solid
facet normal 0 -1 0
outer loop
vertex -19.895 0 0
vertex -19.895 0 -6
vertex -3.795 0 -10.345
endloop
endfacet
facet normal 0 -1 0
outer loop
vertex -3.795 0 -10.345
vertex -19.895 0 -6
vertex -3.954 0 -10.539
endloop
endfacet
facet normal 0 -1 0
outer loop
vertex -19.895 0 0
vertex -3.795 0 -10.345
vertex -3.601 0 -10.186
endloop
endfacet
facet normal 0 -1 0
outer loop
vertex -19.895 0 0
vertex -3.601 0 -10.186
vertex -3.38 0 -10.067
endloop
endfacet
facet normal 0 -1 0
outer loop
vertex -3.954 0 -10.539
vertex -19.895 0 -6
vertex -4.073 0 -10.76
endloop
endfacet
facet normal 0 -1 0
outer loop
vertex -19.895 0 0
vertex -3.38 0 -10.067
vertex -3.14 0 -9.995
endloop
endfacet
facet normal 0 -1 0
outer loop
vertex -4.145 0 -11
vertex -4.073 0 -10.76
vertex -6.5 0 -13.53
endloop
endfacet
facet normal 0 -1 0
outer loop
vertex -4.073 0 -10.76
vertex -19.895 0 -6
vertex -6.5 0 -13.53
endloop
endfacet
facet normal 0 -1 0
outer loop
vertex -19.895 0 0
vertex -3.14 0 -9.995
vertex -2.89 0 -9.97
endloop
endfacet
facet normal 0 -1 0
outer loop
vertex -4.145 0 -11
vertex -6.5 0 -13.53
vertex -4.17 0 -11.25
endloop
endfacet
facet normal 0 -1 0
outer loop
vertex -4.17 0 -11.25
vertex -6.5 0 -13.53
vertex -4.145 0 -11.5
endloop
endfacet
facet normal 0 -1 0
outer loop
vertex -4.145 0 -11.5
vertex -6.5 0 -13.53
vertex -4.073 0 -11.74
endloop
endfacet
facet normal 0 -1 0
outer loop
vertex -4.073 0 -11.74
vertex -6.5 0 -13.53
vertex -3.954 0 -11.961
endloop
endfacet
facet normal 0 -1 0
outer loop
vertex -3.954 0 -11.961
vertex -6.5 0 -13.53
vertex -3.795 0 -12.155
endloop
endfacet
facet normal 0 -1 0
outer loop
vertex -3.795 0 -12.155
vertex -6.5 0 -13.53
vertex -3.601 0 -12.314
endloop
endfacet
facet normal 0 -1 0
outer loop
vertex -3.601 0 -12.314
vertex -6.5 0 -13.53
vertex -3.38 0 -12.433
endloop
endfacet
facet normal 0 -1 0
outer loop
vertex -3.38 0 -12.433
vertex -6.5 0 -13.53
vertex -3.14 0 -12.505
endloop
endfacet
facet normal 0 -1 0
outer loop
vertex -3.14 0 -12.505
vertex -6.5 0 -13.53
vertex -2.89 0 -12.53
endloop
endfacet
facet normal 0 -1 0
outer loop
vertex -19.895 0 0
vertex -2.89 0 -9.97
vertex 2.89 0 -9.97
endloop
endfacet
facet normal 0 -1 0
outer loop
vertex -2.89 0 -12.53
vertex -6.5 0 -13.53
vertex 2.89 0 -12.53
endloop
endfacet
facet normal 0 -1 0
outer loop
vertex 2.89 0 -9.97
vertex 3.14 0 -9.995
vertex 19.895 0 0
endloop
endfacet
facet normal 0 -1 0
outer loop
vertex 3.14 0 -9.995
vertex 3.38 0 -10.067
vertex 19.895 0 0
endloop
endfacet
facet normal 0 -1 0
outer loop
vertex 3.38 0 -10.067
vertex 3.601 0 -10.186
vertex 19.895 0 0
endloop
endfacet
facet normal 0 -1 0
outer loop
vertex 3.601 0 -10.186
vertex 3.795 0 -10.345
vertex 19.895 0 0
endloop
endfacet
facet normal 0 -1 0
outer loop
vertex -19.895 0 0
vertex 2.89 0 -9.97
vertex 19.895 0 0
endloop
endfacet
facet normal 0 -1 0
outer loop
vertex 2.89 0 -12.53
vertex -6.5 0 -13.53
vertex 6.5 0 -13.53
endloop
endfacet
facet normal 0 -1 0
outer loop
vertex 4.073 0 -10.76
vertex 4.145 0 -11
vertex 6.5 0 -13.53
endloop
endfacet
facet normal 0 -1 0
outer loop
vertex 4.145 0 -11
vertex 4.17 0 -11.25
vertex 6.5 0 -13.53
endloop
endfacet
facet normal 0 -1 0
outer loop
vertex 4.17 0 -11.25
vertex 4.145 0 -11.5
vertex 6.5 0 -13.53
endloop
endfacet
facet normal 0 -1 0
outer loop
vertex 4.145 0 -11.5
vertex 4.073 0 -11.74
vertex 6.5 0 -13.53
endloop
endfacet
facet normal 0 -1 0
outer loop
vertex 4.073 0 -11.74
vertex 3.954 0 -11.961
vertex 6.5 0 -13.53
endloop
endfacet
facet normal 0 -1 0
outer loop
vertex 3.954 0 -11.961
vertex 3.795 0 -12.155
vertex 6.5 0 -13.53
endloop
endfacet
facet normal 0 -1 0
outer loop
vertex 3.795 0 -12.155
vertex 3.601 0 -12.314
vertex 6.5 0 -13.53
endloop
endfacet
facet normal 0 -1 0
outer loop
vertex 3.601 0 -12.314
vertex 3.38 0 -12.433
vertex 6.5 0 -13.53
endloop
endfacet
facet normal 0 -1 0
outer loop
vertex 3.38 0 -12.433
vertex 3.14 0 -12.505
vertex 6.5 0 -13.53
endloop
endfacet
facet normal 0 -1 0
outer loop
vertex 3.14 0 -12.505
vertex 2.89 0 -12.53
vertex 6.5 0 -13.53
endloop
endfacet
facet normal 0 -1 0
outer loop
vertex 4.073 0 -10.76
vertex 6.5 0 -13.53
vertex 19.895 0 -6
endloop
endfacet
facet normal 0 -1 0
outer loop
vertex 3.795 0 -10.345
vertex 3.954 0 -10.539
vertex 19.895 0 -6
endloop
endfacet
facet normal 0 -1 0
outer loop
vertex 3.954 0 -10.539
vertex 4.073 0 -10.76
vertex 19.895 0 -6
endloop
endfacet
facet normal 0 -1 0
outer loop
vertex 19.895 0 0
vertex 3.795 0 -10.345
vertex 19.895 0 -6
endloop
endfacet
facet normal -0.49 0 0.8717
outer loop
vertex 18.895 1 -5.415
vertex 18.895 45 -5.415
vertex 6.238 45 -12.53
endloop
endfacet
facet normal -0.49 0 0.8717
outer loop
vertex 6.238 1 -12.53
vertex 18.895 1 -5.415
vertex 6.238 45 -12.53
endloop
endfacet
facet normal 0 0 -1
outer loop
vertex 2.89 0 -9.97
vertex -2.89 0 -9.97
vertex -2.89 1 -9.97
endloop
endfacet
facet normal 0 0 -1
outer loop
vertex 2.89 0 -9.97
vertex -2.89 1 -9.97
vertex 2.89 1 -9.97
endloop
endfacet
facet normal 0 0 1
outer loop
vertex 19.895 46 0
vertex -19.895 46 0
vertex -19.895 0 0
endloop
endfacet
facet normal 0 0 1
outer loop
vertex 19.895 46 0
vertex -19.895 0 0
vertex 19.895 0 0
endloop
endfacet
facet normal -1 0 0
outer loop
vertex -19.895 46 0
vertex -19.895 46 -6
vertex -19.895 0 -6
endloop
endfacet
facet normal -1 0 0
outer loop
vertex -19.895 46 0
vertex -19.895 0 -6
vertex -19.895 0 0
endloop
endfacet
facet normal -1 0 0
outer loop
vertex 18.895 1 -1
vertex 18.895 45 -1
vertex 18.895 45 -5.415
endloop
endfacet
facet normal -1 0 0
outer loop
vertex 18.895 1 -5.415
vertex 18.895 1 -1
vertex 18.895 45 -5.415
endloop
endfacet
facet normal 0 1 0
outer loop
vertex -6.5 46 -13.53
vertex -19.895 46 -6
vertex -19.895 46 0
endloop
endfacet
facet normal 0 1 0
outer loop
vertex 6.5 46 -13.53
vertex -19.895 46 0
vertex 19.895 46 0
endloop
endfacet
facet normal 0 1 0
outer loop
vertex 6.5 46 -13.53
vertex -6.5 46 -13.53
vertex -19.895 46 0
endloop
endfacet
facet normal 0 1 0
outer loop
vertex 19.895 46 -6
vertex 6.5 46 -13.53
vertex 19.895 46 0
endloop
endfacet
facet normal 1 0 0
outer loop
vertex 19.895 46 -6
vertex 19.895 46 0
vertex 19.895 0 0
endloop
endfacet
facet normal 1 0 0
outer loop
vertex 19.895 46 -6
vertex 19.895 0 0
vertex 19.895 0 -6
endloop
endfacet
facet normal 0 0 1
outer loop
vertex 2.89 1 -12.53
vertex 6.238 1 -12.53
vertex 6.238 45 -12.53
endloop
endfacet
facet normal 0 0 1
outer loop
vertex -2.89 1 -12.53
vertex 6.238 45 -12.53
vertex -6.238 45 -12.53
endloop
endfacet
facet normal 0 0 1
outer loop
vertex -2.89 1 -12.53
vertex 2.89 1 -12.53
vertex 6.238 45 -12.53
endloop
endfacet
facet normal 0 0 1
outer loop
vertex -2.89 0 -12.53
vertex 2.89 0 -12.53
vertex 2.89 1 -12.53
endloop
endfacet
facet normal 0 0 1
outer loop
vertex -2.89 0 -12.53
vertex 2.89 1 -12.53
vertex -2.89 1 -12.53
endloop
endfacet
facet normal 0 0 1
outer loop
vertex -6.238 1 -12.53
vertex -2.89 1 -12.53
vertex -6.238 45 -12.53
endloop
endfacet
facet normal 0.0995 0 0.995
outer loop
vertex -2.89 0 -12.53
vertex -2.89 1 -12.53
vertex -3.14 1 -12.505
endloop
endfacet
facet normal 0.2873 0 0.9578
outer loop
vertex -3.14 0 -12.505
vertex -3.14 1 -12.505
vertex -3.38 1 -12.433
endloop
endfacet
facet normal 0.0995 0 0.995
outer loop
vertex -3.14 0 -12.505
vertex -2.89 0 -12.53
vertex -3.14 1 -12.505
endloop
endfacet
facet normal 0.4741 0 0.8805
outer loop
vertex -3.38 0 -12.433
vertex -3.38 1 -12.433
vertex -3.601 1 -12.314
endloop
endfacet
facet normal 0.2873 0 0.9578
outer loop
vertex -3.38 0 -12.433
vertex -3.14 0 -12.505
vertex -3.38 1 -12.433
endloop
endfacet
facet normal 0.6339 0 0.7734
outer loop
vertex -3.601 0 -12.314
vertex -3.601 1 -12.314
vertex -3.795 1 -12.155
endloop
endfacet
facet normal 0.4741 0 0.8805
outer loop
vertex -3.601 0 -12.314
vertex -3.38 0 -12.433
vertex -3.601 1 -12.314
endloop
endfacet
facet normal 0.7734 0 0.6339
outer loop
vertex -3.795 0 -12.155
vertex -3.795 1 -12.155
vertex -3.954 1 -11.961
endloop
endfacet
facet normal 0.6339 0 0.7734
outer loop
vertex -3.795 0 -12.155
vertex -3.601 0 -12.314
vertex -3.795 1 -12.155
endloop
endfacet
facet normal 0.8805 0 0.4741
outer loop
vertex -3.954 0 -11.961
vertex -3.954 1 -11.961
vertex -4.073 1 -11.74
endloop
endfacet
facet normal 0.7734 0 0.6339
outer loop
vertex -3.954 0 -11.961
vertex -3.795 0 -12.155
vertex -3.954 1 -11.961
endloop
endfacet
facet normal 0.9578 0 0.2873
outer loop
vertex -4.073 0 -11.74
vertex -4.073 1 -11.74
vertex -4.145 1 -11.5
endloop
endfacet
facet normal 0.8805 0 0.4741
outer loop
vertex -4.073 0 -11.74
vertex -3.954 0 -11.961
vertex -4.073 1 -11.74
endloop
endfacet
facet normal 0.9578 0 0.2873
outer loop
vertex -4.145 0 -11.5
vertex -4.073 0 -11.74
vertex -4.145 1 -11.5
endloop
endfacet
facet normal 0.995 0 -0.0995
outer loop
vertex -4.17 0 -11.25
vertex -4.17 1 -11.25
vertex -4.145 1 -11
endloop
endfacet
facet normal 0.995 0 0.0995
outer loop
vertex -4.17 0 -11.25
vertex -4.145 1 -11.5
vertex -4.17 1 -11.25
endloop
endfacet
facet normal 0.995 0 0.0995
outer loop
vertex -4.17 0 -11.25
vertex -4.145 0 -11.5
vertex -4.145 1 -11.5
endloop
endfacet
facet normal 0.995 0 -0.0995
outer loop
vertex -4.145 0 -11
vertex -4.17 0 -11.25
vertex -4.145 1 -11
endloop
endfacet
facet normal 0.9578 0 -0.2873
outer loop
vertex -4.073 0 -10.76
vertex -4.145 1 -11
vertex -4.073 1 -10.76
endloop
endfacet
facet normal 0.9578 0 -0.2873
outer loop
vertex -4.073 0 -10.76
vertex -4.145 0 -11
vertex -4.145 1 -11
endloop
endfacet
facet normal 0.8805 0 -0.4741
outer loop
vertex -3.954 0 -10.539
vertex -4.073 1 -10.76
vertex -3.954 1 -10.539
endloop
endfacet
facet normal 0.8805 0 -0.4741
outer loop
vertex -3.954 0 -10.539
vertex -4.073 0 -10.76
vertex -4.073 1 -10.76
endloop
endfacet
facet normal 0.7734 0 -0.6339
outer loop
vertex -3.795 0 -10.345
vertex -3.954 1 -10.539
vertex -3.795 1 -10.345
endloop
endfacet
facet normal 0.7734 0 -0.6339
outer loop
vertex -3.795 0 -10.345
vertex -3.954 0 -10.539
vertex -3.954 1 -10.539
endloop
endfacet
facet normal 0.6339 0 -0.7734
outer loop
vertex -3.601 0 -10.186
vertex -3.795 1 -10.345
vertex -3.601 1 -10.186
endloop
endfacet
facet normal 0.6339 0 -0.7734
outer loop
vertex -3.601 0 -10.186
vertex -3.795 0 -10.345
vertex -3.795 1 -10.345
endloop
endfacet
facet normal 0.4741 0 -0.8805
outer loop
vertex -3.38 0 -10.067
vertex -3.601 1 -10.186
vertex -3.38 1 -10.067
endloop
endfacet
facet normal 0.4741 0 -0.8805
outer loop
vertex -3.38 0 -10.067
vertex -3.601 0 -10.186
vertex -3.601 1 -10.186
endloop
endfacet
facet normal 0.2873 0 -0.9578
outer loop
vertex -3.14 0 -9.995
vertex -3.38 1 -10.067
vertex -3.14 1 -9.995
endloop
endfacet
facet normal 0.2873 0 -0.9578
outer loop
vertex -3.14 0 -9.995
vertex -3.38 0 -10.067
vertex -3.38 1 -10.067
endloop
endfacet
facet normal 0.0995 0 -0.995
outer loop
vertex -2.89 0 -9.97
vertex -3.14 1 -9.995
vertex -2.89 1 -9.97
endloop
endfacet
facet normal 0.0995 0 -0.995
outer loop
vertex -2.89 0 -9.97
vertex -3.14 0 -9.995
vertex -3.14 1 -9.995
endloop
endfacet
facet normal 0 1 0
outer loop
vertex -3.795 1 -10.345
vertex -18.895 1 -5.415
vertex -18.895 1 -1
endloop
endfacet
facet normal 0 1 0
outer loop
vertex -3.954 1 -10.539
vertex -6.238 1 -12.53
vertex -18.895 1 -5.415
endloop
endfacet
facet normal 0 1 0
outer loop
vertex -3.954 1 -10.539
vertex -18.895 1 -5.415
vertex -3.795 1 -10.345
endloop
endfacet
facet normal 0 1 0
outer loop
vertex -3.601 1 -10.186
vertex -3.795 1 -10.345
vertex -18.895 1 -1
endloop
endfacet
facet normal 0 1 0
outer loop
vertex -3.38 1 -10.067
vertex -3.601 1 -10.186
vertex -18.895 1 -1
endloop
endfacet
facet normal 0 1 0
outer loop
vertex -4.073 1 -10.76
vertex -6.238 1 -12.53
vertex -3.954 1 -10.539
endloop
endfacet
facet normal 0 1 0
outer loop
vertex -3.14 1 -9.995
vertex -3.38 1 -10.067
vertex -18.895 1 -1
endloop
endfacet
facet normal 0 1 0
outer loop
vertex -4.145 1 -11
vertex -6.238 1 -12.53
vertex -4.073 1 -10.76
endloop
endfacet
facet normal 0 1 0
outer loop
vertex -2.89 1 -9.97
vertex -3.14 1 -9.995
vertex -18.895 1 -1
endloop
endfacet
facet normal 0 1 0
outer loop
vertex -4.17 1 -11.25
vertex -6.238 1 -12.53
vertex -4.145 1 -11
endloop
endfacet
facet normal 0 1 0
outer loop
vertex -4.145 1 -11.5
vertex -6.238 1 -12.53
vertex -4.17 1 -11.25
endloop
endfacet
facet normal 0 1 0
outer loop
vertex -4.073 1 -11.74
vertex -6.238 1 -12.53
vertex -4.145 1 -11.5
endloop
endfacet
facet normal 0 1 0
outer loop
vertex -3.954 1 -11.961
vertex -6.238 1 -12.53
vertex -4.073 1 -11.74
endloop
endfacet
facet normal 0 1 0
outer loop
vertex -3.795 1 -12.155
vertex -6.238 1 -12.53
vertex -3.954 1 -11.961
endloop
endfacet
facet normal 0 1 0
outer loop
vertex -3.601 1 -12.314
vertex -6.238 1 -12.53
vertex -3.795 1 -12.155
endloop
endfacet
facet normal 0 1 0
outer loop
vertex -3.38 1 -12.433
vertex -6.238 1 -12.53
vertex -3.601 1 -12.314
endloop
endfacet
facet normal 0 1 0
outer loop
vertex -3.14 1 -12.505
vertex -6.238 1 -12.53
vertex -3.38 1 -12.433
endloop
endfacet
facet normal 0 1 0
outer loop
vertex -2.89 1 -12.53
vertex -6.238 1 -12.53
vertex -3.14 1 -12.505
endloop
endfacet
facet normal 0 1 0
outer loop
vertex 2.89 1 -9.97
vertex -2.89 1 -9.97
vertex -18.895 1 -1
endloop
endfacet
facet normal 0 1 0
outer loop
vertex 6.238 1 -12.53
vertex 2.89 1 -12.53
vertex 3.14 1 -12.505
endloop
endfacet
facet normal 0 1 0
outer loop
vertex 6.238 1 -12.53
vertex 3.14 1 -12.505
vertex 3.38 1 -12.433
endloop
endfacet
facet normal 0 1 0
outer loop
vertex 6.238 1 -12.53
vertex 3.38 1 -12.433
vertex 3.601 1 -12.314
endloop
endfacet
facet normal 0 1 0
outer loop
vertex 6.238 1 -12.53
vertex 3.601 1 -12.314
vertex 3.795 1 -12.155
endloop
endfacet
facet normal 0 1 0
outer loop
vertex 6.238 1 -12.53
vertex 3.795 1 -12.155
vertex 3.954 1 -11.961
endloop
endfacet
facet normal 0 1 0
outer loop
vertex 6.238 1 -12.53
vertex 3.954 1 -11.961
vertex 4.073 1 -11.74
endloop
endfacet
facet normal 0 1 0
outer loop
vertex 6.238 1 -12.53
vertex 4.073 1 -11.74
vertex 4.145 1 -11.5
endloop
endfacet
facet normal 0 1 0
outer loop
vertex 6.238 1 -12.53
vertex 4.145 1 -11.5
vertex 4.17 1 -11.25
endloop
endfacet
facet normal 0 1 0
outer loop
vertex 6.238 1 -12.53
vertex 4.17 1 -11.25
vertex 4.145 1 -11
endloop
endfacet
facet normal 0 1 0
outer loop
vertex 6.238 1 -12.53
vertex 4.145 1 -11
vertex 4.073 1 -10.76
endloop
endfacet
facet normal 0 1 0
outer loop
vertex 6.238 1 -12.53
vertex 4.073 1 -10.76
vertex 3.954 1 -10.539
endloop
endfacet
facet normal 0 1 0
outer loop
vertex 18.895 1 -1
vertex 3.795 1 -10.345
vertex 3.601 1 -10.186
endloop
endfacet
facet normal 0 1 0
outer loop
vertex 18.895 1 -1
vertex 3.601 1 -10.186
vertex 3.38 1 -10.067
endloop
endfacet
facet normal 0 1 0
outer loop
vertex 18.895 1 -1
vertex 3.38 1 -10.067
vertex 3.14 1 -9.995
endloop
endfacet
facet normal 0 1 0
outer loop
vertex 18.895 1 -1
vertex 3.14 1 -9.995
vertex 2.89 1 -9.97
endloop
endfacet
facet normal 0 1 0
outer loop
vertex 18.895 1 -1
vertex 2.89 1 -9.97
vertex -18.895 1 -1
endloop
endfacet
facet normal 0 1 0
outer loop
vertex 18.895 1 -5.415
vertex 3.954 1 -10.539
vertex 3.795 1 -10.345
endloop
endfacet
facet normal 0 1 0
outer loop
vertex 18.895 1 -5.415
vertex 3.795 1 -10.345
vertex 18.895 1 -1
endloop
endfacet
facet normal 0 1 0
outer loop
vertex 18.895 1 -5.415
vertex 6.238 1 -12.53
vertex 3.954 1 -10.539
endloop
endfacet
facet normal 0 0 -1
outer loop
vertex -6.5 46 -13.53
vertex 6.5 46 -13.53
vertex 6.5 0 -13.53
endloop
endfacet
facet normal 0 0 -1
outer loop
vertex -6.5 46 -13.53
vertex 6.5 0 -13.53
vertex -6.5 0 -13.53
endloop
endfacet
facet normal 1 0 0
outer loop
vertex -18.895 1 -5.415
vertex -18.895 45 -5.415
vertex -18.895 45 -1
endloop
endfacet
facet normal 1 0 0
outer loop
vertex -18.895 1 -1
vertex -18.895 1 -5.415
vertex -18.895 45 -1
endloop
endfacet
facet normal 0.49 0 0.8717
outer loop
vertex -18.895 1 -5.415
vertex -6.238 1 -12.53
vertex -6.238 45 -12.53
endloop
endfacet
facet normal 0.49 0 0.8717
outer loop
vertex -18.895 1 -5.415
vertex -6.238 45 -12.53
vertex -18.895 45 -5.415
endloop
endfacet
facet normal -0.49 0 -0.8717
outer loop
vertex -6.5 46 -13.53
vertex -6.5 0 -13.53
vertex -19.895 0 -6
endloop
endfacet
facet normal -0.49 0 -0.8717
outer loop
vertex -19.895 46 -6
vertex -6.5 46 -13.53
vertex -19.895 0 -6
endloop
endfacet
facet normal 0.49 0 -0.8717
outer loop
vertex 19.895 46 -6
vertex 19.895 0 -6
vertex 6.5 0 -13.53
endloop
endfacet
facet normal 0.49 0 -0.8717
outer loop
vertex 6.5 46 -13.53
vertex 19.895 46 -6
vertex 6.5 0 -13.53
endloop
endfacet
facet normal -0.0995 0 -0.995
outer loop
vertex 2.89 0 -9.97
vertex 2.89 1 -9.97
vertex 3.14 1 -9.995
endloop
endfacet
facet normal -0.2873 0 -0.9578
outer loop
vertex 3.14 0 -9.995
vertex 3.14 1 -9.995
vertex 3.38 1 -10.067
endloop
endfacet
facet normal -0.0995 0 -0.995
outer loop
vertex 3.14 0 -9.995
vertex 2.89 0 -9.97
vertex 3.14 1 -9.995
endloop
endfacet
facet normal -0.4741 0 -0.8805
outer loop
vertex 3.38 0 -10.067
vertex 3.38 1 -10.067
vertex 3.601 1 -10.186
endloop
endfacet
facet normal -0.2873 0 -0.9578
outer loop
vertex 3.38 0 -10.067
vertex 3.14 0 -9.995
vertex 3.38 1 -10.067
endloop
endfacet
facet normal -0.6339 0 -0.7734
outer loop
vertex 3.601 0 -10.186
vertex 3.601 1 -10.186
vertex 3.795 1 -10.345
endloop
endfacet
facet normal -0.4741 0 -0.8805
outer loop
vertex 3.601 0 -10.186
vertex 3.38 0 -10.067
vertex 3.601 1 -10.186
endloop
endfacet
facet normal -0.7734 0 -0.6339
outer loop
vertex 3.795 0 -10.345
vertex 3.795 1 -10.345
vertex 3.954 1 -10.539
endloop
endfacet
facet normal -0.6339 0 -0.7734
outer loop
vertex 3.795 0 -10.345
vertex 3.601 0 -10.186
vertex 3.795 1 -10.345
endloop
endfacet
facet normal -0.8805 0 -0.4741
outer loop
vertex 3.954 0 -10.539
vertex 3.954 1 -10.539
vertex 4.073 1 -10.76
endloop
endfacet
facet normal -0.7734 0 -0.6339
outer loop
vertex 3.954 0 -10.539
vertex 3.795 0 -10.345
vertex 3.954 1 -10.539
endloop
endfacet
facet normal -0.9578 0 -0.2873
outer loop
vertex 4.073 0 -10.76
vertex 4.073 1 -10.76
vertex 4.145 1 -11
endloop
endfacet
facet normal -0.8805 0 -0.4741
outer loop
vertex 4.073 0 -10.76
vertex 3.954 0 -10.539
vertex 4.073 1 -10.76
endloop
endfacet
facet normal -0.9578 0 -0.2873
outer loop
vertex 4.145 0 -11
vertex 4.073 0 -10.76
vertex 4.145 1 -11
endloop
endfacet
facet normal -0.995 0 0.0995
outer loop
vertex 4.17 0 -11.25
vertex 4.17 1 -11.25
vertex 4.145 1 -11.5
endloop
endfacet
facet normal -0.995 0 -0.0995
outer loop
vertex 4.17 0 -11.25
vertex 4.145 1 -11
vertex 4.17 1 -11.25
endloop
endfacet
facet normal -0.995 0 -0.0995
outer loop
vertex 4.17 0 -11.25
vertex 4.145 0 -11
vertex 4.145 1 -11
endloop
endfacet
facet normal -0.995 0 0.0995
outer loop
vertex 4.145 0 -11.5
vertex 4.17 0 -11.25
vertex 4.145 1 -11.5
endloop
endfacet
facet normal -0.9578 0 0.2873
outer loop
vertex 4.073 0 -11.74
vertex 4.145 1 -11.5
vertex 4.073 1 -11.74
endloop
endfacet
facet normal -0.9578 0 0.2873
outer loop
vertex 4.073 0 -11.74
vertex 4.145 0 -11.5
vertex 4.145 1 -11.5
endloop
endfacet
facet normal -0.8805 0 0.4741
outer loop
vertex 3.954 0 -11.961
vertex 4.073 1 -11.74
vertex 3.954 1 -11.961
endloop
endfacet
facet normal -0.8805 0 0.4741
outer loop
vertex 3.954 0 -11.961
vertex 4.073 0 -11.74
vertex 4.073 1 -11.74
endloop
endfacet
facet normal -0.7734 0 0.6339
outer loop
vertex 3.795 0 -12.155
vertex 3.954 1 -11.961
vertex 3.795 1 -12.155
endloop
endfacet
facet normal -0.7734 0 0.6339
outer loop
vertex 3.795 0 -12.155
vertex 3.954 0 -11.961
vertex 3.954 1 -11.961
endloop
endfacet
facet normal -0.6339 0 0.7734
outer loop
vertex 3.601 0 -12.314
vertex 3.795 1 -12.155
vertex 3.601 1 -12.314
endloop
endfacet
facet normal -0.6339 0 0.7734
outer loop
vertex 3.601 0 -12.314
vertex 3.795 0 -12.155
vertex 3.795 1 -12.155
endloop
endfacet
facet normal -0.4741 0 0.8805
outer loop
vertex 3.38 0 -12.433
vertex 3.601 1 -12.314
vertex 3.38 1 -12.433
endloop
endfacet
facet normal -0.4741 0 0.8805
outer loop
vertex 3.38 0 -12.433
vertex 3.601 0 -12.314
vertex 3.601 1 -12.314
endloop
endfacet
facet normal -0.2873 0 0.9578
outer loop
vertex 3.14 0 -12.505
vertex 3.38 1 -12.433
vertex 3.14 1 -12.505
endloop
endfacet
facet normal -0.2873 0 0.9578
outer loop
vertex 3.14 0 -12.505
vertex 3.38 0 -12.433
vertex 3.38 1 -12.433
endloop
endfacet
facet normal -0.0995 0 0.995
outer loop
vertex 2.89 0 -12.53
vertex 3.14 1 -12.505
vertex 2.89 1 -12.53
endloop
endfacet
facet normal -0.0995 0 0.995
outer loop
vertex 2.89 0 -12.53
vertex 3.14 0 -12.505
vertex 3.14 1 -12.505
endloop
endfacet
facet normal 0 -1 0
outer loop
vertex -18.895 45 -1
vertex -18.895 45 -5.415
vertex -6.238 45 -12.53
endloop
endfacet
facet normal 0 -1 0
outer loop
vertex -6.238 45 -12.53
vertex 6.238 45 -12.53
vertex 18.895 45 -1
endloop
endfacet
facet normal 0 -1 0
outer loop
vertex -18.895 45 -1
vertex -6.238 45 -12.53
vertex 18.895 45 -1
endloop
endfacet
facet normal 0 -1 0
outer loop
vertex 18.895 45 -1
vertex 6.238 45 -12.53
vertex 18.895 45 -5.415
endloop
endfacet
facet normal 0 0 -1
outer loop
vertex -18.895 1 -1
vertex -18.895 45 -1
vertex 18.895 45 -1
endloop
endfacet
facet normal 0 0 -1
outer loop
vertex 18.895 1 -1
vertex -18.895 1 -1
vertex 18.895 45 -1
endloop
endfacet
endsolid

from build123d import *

# Parameters (mm, degrees)
BOSS_EXTRUDE1_DEPTH = 46
CUT_EXTRUDE1_START  = -1
CUT_EXTRUDE1_DEPTH  = 44
CUT_EXTRUDE2_REACH  = 53.912


with BuildPart() as part:
    # Sketch1 → Boss-Extrude1 (new body)
    with BuildSketch(Plane(origin=(0, 0, 0), x_dir=(1, 0, 0), z_dir=(0, 1, 0))):
        Polygon((-19.895, 0), (19.895, 0), (19.895, 6), (6.5, 13.53), (-6.5, 13.53), (-19.895, 6), align=None)
    extrude(amount=BOSS_EXTRUDE1_DEPTH)

    # Sketch2 → Cut-Extrude1 (cut)
    with BuildSketch(Plane(origin=(0, 46, 0), x_dir=(1, 0, 0), z_dir=(0, 1, 0)).offset(CUT_EXTRUDE1_START)):
        Polygon((18.895, 5.414974095), (6.23819097, 12.53), (-6.23819097, 12.53), (-18.895, 5.414974095), (-18.895, 1), (18.895, 1), align=None)
    extrude(amount=-CUT_EXTRUDE1_DEPTH, mode=Mode.SUBTRACT)

    # Sketch3 → Cut-Extrude2 (cut, up to next)
    with BuildSketch(Plane.XZ, mode=Mode.PRIVATE) as cut_extrude2_sk1:
        with BuildLine():
            Line((-2.89, -9.97), (2.89, -9.97))
            ThreePointArc((2.89, -9.97), (4.17, -11.25), (2.89, -12.53))
            Line((2.89, -12.53), (-2.89, -12.53))
            ThreePointArc((-2.89, -12.53), (-4.17, -11.25), (-2.89, -9.97))
        make_face()
    cut_extrude2_tool1 = extrude(cut_extrude2_sk1.sketch, amount=-CUT_EXTRUDE2_REACH, mode=Mode.PRIVATE) & part.part
    add(cut_extrude2_tool1.solids().sort_by_distance((0, 0, -11.25))[0], mode=Mode.SUBTRACT)


solid = part.part
